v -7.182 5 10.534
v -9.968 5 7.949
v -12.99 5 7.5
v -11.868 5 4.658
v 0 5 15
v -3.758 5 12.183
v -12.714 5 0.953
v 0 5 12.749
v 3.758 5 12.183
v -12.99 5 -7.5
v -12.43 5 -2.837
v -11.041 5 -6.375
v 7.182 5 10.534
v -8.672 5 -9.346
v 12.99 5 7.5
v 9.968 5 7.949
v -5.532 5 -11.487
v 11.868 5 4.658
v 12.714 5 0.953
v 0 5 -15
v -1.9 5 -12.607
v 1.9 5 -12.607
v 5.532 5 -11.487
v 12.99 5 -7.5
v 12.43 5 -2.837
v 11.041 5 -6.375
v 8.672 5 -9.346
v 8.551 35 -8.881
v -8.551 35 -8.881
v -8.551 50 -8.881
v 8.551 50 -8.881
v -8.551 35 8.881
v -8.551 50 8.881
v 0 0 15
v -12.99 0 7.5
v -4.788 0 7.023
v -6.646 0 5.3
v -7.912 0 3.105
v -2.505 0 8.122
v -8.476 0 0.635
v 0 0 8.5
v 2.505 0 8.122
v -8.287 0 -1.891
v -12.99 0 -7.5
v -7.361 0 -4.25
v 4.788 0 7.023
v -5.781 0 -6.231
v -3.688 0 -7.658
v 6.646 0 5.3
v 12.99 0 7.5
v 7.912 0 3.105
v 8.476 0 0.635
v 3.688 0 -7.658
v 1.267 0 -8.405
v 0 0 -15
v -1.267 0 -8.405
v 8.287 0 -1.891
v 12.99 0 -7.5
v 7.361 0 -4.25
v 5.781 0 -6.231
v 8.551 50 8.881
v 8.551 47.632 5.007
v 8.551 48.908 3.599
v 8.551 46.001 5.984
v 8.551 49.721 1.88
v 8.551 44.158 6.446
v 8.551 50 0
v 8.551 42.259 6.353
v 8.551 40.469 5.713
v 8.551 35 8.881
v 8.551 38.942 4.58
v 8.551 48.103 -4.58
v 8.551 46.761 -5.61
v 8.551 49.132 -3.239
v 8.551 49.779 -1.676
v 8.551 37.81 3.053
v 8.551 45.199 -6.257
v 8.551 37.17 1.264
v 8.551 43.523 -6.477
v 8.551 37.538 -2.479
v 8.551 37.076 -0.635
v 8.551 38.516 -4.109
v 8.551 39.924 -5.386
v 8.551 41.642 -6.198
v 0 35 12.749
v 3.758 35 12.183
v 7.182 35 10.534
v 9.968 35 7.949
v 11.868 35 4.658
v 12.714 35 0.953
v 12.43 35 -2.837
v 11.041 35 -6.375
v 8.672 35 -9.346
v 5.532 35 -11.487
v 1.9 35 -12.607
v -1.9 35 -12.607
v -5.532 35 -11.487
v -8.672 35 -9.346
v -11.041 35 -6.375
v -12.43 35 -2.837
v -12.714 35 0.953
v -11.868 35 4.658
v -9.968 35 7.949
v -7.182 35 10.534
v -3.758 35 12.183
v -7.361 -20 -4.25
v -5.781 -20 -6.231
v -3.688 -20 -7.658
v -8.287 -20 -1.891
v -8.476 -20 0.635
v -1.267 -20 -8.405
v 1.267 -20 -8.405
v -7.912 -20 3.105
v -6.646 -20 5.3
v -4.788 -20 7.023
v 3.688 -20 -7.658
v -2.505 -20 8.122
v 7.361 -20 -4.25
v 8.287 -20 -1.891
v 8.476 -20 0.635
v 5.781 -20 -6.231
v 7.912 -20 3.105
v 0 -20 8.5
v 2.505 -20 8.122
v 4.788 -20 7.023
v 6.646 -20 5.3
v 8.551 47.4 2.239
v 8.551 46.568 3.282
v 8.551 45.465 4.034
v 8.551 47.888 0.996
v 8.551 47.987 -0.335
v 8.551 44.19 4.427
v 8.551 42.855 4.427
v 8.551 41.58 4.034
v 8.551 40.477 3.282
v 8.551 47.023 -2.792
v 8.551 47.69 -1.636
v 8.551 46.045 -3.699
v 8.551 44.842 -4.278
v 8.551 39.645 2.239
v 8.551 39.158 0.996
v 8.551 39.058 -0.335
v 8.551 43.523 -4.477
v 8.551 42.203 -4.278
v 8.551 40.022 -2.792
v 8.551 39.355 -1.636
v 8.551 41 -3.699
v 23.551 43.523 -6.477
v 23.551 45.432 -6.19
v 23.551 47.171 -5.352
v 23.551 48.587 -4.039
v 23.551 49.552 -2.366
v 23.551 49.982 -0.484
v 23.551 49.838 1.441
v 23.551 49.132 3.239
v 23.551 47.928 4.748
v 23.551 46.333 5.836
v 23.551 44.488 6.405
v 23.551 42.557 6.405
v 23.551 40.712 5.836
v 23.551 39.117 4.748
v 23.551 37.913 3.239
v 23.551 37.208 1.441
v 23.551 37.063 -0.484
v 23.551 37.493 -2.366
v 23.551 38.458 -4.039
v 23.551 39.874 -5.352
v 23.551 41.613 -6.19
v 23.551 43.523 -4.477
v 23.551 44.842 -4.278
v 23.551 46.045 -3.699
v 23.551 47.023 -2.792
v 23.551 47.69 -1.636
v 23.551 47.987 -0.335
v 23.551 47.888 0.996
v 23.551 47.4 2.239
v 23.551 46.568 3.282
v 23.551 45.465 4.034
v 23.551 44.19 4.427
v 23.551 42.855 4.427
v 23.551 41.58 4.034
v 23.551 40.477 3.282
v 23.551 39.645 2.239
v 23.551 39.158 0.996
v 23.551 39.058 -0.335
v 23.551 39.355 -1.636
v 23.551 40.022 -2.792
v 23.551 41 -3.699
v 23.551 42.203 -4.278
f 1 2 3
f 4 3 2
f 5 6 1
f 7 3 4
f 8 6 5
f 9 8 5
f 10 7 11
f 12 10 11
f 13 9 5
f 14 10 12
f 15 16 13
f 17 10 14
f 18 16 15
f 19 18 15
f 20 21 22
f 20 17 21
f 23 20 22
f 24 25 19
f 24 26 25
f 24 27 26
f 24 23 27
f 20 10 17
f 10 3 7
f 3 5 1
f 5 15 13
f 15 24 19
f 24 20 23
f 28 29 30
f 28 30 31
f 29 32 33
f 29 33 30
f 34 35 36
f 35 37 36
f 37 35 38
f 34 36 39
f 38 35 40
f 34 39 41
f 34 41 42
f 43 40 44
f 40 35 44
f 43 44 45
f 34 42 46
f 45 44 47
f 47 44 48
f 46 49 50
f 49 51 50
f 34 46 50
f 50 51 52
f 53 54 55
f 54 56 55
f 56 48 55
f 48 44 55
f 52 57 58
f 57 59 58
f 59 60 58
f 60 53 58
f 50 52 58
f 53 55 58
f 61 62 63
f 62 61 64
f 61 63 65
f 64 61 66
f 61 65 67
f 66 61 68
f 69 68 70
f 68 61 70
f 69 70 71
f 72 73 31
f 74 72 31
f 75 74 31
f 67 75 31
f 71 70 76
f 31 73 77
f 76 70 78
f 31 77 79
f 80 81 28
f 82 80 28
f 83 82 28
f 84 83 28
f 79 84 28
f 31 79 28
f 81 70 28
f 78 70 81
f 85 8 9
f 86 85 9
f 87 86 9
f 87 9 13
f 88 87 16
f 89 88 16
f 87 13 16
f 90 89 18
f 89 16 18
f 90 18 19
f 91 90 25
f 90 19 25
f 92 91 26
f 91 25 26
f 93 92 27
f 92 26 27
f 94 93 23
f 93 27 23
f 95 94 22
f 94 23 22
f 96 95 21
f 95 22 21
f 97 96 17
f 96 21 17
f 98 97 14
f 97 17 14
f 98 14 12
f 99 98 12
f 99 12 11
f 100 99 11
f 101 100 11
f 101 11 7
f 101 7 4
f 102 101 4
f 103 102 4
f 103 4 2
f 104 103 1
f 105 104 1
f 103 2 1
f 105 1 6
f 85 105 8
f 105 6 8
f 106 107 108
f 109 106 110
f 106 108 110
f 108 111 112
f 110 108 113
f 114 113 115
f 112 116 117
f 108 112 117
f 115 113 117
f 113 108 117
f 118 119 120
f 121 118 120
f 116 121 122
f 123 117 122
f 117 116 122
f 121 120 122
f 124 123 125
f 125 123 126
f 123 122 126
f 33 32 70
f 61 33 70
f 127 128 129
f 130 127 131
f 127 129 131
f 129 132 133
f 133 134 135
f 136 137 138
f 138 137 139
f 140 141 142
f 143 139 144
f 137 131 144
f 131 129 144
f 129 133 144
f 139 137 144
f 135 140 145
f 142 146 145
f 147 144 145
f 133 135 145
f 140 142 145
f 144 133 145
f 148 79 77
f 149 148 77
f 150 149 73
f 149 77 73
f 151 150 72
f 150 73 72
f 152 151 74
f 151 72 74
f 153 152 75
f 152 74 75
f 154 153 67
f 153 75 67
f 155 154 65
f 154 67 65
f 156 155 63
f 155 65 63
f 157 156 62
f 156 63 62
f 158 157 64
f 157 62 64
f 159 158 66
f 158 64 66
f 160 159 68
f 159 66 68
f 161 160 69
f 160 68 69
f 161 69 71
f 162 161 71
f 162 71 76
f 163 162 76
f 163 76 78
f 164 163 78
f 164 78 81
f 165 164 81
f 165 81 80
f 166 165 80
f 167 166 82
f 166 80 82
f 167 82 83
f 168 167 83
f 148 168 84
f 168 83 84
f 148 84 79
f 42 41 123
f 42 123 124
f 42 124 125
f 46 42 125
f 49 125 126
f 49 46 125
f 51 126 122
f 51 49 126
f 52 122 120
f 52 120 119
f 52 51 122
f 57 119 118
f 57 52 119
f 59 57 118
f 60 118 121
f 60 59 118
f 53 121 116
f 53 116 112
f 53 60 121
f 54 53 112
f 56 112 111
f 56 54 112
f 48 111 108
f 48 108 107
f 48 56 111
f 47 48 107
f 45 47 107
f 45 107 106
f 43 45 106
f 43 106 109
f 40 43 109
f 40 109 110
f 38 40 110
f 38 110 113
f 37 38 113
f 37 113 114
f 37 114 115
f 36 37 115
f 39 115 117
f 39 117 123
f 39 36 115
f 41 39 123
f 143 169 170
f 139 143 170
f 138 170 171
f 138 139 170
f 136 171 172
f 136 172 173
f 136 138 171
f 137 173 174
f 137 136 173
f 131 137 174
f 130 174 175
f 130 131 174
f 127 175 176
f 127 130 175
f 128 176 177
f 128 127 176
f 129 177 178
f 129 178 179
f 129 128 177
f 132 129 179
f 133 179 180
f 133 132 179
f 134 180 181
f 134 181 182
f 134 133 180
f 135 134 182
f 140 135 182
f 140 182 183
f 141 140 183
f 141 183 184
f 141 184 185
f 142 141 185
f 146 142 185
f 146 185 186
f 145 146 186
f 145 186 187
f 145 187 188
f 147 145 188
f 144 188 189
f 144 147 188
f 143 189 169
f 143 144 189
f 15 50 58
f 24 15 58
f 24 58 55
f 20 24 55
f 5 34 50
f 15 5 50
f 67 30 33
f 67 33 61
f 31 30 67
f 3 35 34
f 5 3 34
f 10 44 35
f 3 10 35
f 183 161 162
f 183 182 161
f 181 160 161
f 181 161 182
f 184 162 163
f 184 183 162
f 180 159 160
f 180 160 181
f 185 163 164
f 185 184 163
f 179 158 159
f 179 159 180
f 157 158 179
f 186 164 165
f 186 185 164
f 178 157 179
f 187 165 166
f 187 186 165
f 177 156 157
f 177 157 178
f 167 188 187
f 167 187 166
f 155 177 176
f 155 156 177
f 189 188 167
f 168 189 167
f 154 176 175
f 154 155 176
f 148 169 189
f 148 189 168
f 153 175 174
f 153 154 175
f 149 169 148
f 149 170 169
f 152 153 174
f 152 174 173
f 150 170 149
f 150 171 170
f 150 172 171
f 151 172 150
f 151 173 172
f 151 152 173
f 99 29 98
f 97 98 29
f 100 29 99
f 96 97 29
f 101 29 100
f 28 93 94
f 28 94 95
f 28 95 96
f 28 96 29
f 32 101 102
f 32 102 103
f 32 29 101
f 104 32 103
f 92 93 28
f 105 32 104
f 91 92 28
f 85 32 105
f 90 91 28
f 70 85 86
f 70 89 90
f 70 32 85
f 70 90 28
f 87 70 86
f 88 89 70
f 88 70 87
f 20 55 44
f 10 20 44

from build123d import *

# Parameters (mm, degrees)
SKETCH1_R           = 8.5
BOSS_EXTRUDE1_DEPTH = 20
BOSS_EXTRUDE2_DEPTH = 5
SKETCH3_R           = 12.74933558
BOSS_EXTRUDE3_DEPTH = 30
SKETCH4_W           = 17.102448084
SKETCH4_H           = 17.762774264
BOSS_EXTRUDE4_DEPTH = 15
SKETCH5_R           = 6.477355188
SKETCH5_R_2         = 4.477355188
EXTRUDE_THIN1_DEPTH = 15


with BuildPart() as part:
    # Sketch1 → Boss-Extrude1 (new body)
    with BuildSketch(Plane(origin=(0, 0, 0), x_dir=(1, 0, 0), z_dir=(0, 1, 0))):
        with Locations(Location((0, 0, 0), (0, 0, 270))):
            Circle(SKETCH1_R)
    extrude(amount=-BOSS_EXTRUDE1_DEPTH)

    # Sketch2 → Boss-Extrude2 (add)
    with BuildSketch(Plane(origin=(0, 0, 0), x_dir=(1, 0, 0), z_dir=(0, 1, 0))):
        Polygon((0, 15), (-12.990381057, 7.5), (-12.990381057, -7.5), (0, -15), (12.990381057, -7.5), (12.990381057, 7.5), align=None)
    extrude(amount=BOSS_EXTRUDE2_DEPTH)

    # Sketch3 → Boss-Extrude3 (add)
    with BuildSketch(Plane(origin=(0, 5, 0), x_dir=(1, 0, 0), z_dir=(0, 1, 0))):
        with Locations(Location((0, 0, 0), (0, 0, 270))):
            Circle(SKETCH3_R)
    extrude(amount=BOSS_EXTRUDE3_DEPTH)

    # Sketch4 → Boss-Extrude4 (add)
    with BuildSketch(Plane(origin=(0, 35, 0), x_dir=(1, 0, 0), z_dir=(0, 1, 0))):
        Rectangle(SKETCH4_W, SKETCH4_H)
    extrude(amount=BOSS_EXTRUDE4_DEPTH)

    # Sketch5 → Extrude-Thin1 (add)
    with BuildSketch(Plane(origin=(8.551224042, 0, 0), x_dir=(0, 0, -1), z_dir=(1, 0, 0))):
        with Locations((0, 43.522644812)):
            Circle(SKETCH5_R)
        with Locations((0, 43.522644812)):
            Circle(SKETCH5_R_2, mode=Mode.SUBTRACT)
    extrude(amount=EXTRUDE_THIN1_DEPTH)


solid = part.part
